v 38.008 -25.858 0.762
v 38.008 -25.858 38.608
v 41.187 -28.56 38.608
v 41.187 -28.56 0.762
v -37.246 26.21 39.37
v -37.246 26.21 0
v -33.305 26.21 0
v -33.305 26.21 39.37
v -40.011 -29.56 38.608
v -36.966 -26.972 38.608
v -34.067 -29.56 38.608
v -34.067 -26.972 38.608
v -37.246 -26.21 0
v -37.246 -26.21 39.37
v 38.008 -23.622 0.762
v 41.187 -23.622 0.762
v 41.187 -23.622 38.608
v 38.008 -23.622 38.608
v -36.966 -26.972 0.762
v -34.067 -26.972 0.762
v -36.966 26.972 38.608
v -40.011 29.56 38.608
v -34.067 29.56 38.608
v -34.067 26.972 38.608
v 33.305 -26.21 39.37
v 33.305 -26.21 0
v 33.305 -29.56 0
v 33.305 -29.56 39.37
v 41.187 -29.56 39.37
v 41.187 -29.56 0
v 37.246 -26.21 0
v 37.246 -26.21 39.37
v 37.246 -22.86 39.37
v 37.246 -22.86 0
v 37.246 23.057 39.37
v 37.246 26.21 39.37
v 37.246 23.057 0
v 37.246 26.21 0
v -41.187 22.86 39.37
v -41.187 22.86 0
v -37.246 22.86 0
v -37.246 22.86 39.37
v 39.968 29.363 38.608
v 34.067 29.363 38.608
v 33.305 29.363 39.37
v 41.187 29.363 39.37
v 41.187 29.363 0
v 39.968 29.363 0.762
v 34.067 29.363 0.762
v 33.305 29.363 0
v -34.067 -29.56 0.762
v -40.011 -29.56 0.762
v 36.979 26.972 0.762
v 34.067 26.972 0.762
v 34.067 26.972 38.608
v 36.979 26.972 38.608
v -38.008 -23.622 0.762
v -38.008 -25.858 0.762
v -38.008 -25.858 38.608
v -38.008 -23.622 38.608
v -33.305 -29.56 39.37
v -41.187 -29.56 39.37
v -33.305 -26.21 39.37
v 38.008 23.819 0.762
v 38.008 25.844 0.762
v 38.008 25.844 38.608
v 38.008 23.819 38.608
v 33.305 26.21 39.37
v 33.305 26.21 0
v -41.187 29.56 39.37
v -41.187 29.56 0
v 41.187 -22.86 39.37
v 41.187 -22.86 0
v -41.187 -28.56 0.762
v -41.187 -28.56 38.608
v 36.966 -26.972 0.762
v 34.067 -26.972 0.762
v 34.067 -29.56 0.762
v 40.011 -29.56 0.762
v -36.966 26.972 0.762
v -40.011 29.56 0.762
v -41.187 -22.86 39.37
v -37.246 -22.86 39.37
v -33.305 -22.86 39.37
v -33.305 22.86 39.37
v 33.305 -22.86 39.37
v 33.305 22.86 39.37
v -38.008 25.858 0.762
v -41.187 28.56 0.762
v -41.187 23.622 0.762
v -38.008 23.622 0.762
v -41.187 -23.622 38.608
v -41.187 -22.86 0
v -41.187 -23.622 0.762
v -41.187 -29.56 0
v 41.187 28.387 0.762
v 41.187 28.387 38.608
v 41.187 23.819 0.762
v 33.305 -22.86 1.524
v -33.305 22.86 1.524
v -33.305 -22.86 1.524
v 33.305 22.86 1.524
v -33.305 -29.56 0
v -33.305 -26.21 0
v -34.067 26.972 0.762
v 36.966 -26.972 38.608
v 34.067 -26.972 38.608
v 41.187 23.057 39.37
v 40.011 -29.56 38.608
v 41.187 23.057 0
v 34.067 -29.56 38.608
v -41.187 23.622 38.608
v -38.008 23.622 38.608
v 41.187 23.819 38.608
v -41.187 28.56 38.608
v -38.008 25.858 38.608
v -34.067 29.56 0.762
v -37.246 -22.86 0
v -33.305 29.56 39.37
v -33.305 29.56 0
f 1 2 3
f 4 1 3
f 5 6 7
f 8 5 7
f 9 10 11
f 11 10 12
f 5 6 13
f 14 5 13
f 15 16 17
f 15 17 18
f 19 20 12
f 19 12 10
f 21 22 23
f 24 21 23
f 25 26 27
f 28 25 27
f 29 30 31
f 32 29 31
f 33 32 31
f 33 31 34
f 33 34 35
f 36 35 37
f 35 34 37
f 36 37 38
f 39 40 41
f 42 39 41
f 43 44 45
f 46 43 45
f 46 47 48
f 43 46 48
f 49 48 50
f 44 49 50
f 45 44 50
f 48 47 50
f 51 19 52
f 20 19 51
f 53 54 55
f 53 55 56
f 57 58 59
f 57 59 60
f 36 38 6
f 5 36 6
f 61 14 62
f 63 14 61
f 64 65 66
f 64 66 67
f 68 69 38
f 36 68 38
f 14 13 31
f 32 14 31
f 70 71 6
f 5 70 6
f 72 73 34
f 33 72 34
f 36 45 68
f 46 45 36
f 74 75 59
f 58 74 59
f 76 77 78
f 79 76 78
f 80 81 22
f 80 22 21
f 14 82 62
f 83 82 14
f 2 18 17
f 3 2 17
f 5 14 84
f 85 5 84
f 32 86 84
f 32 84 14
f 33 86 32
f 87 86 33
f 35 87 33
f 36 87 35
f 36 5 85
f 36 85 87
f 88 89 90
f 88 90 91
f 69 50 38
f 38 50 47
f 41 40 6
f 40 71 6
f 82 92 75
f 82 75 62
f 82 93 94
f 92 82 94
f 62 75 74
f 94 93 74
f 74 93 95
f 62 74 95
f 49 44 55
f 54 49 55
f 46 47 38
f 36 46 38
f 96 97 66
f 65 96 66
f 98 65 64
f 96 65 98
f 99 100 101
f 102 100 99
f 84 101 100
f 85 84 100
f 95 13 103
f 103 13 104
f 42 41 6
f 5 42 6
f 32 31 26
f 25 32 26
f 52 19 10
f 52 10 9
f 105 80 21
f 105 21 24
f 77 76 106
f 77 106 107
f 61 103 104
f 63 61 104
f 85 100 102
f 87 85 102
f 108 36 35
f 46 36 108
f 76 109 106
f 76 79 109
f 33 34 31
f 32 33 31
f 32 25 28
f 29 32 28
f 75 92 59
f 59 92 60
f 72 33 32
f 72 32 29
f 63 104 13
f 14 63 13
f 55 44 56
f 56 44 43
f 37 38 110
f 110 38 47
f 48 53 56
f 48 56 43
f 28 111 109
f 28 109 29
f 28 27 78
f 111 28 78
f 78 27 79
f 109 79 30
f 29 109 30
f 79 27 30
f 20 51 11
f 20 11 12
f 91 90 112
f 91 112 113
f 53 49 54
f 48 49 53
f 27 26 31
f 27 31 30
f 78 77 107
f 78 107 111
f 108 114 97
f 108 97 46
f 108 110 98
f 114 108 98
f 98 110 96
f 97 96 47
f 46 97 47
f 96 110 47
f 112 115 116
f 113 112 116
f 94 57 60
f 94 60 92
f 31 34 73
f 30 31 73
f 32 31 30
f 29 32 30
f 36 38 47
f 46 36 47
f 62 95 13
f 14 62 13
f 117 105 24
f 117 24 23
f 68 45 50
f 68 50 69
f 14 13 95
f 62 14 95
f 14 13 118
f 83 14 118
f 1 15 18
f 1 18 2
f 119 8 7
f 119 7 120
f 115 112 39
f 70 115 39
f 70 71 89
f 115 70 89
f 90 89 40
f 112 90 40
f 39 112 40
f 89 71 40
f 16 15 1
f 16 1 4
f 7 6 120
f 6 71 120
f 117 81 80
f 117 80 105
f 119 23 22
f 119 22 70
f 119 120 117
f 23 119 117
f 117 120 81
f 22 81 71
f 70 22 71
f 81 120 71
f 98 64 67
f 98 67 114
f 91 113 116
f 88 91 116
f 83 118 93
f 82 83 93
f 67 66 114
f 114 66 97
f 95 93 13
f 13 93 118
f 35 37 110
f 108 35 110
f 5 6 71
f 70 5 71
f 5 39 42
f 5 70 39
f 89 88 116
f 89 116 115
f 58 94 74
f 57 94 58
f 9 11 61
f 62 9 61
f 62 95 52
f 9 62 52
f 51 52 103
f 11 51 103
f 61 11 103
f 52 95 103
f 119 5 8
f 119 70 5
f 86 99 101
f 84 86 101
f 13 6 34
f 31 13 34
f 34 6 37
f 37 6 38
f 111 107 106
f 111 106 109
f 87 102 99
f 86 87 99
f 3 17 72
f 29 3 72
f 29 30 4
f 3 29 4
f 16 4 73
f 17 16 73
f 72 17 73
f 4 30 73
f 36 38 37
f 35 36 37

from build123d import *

# Parameters (mm, degrees)
F0_W     = 66.6093081236
F0_H     = 45.7200035453
F1_DEPTH = 1.524
F0_W_2   = 3.9413794875
F0_H_2   = 45.71999982
F0_H_3   = 3.1531043351
F0_H_4   = 3.3501740545
F0_H_5   = 3.3501703292
F2_DEPTH = 39.37
F3_DEPTH = 39.37
F4_DEPTH = 39.37
F5_T     = -0.762
F5_2_T   = -0.762
F5_3_T   = -0.762
F5_4_T   = -0.762
F5_5_T   = -0.762
F5_6_T   = -0.762
F5_7_T   = -0.762
F5_8_T   = -0.762


# Not quite as in the source:
# - ends of sketch curves that miss each other by under 0.0002 mm in the source are joined


with BuildPart() as f1:
    # F0 (on Top) → F1 (new body)
    with BuildSketch(Plane.XY):
        Rectangle(F0_W, F0_H)
    extrude(amount=F1_DEPTH)

    # F0 (on Top) → F2 (join)
    with BuildSketch(Plane.XY):
        Polygon((33.3046540618, -26.2101721019), (33.3046540618, -22.8599980474), (-33.3046540618, -22.8600017726), (-33.3046540618, -26.2101721019), align=None)
        with Locations((-35.2753438056, 1.8626e-06)):
            Rectangle(F0_W_2, F0_H_2)
        with Locations((35.2753438056, 24.6336199343)):
            Rectangle(F0_W_2, F0_H_3)
        Polygon((33.3046540618, 22.8600017726), (33.3046540618, -22.8600017726), (37.2460335493, -22.8599980474), (37.2460335493, 23.0570677668), (33.3046540618, 23.0570677668), (33.3046540618, 26.2101721019), (-33.3046540618, 26.2101721019), (-33.3046540618, 22.8600017726), align=None)
        with Locations((35.2753438056, -24.5350850746)):
            Rectangle(F0_W_2, F0_H_4)
        with Locations((-35.2753438056, -24.5350850746)):
            Rectangle(F0_W_2, F0_H_4)
        with Locations((-35.2753438056, 24.5350869372)):
            Rectangle(F0_W_2, F0_H_5)
    extrude(amount=F2_DEPTH)


with BuildPart() as f3:
    # F0 (on Top) → F3 (new body)
    with BuildSketch(Plane.XY):
        Polygon((-41.1874130368, 22.8600017726), (-37.2460335493, 22.8600017726), (-37.2460335493, 26.2101721019), (-41.1874130368, 29.5603424311), align=None)
    extrude(amount=F3_DEPTH)

    # F5#8
    f5_8_openings = [f3.faces().sort_by_distance(p)[0] for p in [
        (-41.187413, 26.210172, 19.685),
    ]]
    offset(amount=F5_8_T, openings=f5_8_openings)


with BuildPart() as f3b:
    # F0 (on Top) → F3, piece 2 (new body)
    with BuildSketch(Plane.XY):
        Polygon((-33.3046540618, -29.5603461564), (-33.3046540618, -26.2101721019), (-37.2460335493, -26.2101721019), (-41.1874130368, -29.5603461564), align=None)
    extrude(amount=F3_DEPTH)

    # F5
    f5_openings = [f3b.faces().sort_by_distance(p)[0] for p in [
        (-37.246034, -29.560346, 19.685),
    ]]
    offset(amount=F5_T, openings=f5_openings)


with BuildPart() as f3c:
    # F0 (on Top) → F3, piece 3 (new body)
    with BuildSketch(Plane.XY):
        Polygon((41.1874130368, -22.8599980474), (37.2460335493, -22.8599980474), (37.2460335493, -26.2101721019), (41.1874130368, -29.5603461564), align=None)
    extrude(amount=F3_DEPTH)

    # F5#3
    f5_3_openings = [f3c.faces().sort_by_distance(p)[0] for p in [
        (41.187413, -26.210172, 19.685),
    ]]
    offset(amount=F5_3_T, openings=f5_3_openings)


with BuildPart() as f3d:
    # F0 (on Top) → F3, piece 4 (new body)
    with BuildSketch(Plane.XY):
        Polygon((37.2460335493, 26.2101721019), (37.2460335493, 23.0570677668), (41.1874130368, 23.0570677668), (41.1874130368, 29.3632764369), align=None)
    extrude(amount=F3_DEPTH)

    # F5#4
    f5_4_openings = [f3d.faces().sort_by_distance(p)[0] for p in [
        (41.187413, 26.210172, 19.685),
    ]]
    offset(amount=F5_4_T, openings=f5_4_openings)


with BuildPart() as f4:
    # F0 (on Top) → F4 (new body)
    with BuildSketch(Plane.XY):
        Polygon((-37.2460335493, 26.2101721019), (-33.3046540618, 26.2101721019), (-33.3046540618, 29.5603424311), (-41.1874130368, 29.5603424311), align=None)
    extrude(amount=F4_DEPTH)

    # F5#6
    f5_6_openings = [f4.faces().sort_by_distance(p)[0] for p in [
        (-37.246034, 29.560342, 19.685),
    ]]
    offset(amount=F5_6_T, openings=f5_6_openings)


with BuildPart() as f4b:
    # F0 (on Top) → F4, piece 2 (new body)
    with BuildSketch(Plane.XY):
        Polygon((-37.2460335493, -26.2101721019), (-37.2460335493, -22.8599980474), (-41.1874130368, -22.8599980474), (-41.1874130368, -29.5603461564), align=None)
    extrude(amount=F4_DEPTH)

    # F5#7
    f5_7_openings = [f4b.faces().sort_by_distance(p)[0] for p in [
        (-41.187413, -26.210172, 19.685),
    ]]
    offset(amount=F5_7_T, openings=f5_7_openings)


with BuildPart() as f4c:
    # F0 (on Top) → F4, piece 3 (new body)
    with BuildSketch(Plane.XY):
        Polygon((37.2460335493, -26.2101721019), (33.3046540618, -26.2101721019), (33.3046540618, -29.5603461564), (41.1874130368, -29.5603461564), align=None)
    extrude(amount=F4_DEPTH)

    # F5#2
    f5_2_openings = [f4c.faces().sort_by_distance(p)[0] for p in [
        (37.246034, -29.560346, 19.685),
    ]]
    offset(amount=F5_2_T, openings=f5_2_openings, kind=Kind.INTERSECTION)


with BuildPart() as f4d:
    # F0 (on Top) → F4, piece 4 (new body)
    with BuildSketch(Plane.XY):
        Polygon((33.3046540618, 26.2101721019), (37.2460335493, 26.2101721019), (41.1874130368, 29.3632764369), (33.3046540618, 29.3632764369), align=None)
    extrude(amount=F4_DEPTH)

    # F5#5
    f5_5_openings = [f4d.faces().sort_by_distance(p)[0] for p in [
        (37.246034, 29.363276, 19.685),
    ]]
    offset(amount=F5_5_T, openings=f5_5_openings)


solid = Compound([f1.part, f3.part, f3b.part, f3c.part, f3d.part, f4.part, f4b.part, f4c.part, f4d.part])
